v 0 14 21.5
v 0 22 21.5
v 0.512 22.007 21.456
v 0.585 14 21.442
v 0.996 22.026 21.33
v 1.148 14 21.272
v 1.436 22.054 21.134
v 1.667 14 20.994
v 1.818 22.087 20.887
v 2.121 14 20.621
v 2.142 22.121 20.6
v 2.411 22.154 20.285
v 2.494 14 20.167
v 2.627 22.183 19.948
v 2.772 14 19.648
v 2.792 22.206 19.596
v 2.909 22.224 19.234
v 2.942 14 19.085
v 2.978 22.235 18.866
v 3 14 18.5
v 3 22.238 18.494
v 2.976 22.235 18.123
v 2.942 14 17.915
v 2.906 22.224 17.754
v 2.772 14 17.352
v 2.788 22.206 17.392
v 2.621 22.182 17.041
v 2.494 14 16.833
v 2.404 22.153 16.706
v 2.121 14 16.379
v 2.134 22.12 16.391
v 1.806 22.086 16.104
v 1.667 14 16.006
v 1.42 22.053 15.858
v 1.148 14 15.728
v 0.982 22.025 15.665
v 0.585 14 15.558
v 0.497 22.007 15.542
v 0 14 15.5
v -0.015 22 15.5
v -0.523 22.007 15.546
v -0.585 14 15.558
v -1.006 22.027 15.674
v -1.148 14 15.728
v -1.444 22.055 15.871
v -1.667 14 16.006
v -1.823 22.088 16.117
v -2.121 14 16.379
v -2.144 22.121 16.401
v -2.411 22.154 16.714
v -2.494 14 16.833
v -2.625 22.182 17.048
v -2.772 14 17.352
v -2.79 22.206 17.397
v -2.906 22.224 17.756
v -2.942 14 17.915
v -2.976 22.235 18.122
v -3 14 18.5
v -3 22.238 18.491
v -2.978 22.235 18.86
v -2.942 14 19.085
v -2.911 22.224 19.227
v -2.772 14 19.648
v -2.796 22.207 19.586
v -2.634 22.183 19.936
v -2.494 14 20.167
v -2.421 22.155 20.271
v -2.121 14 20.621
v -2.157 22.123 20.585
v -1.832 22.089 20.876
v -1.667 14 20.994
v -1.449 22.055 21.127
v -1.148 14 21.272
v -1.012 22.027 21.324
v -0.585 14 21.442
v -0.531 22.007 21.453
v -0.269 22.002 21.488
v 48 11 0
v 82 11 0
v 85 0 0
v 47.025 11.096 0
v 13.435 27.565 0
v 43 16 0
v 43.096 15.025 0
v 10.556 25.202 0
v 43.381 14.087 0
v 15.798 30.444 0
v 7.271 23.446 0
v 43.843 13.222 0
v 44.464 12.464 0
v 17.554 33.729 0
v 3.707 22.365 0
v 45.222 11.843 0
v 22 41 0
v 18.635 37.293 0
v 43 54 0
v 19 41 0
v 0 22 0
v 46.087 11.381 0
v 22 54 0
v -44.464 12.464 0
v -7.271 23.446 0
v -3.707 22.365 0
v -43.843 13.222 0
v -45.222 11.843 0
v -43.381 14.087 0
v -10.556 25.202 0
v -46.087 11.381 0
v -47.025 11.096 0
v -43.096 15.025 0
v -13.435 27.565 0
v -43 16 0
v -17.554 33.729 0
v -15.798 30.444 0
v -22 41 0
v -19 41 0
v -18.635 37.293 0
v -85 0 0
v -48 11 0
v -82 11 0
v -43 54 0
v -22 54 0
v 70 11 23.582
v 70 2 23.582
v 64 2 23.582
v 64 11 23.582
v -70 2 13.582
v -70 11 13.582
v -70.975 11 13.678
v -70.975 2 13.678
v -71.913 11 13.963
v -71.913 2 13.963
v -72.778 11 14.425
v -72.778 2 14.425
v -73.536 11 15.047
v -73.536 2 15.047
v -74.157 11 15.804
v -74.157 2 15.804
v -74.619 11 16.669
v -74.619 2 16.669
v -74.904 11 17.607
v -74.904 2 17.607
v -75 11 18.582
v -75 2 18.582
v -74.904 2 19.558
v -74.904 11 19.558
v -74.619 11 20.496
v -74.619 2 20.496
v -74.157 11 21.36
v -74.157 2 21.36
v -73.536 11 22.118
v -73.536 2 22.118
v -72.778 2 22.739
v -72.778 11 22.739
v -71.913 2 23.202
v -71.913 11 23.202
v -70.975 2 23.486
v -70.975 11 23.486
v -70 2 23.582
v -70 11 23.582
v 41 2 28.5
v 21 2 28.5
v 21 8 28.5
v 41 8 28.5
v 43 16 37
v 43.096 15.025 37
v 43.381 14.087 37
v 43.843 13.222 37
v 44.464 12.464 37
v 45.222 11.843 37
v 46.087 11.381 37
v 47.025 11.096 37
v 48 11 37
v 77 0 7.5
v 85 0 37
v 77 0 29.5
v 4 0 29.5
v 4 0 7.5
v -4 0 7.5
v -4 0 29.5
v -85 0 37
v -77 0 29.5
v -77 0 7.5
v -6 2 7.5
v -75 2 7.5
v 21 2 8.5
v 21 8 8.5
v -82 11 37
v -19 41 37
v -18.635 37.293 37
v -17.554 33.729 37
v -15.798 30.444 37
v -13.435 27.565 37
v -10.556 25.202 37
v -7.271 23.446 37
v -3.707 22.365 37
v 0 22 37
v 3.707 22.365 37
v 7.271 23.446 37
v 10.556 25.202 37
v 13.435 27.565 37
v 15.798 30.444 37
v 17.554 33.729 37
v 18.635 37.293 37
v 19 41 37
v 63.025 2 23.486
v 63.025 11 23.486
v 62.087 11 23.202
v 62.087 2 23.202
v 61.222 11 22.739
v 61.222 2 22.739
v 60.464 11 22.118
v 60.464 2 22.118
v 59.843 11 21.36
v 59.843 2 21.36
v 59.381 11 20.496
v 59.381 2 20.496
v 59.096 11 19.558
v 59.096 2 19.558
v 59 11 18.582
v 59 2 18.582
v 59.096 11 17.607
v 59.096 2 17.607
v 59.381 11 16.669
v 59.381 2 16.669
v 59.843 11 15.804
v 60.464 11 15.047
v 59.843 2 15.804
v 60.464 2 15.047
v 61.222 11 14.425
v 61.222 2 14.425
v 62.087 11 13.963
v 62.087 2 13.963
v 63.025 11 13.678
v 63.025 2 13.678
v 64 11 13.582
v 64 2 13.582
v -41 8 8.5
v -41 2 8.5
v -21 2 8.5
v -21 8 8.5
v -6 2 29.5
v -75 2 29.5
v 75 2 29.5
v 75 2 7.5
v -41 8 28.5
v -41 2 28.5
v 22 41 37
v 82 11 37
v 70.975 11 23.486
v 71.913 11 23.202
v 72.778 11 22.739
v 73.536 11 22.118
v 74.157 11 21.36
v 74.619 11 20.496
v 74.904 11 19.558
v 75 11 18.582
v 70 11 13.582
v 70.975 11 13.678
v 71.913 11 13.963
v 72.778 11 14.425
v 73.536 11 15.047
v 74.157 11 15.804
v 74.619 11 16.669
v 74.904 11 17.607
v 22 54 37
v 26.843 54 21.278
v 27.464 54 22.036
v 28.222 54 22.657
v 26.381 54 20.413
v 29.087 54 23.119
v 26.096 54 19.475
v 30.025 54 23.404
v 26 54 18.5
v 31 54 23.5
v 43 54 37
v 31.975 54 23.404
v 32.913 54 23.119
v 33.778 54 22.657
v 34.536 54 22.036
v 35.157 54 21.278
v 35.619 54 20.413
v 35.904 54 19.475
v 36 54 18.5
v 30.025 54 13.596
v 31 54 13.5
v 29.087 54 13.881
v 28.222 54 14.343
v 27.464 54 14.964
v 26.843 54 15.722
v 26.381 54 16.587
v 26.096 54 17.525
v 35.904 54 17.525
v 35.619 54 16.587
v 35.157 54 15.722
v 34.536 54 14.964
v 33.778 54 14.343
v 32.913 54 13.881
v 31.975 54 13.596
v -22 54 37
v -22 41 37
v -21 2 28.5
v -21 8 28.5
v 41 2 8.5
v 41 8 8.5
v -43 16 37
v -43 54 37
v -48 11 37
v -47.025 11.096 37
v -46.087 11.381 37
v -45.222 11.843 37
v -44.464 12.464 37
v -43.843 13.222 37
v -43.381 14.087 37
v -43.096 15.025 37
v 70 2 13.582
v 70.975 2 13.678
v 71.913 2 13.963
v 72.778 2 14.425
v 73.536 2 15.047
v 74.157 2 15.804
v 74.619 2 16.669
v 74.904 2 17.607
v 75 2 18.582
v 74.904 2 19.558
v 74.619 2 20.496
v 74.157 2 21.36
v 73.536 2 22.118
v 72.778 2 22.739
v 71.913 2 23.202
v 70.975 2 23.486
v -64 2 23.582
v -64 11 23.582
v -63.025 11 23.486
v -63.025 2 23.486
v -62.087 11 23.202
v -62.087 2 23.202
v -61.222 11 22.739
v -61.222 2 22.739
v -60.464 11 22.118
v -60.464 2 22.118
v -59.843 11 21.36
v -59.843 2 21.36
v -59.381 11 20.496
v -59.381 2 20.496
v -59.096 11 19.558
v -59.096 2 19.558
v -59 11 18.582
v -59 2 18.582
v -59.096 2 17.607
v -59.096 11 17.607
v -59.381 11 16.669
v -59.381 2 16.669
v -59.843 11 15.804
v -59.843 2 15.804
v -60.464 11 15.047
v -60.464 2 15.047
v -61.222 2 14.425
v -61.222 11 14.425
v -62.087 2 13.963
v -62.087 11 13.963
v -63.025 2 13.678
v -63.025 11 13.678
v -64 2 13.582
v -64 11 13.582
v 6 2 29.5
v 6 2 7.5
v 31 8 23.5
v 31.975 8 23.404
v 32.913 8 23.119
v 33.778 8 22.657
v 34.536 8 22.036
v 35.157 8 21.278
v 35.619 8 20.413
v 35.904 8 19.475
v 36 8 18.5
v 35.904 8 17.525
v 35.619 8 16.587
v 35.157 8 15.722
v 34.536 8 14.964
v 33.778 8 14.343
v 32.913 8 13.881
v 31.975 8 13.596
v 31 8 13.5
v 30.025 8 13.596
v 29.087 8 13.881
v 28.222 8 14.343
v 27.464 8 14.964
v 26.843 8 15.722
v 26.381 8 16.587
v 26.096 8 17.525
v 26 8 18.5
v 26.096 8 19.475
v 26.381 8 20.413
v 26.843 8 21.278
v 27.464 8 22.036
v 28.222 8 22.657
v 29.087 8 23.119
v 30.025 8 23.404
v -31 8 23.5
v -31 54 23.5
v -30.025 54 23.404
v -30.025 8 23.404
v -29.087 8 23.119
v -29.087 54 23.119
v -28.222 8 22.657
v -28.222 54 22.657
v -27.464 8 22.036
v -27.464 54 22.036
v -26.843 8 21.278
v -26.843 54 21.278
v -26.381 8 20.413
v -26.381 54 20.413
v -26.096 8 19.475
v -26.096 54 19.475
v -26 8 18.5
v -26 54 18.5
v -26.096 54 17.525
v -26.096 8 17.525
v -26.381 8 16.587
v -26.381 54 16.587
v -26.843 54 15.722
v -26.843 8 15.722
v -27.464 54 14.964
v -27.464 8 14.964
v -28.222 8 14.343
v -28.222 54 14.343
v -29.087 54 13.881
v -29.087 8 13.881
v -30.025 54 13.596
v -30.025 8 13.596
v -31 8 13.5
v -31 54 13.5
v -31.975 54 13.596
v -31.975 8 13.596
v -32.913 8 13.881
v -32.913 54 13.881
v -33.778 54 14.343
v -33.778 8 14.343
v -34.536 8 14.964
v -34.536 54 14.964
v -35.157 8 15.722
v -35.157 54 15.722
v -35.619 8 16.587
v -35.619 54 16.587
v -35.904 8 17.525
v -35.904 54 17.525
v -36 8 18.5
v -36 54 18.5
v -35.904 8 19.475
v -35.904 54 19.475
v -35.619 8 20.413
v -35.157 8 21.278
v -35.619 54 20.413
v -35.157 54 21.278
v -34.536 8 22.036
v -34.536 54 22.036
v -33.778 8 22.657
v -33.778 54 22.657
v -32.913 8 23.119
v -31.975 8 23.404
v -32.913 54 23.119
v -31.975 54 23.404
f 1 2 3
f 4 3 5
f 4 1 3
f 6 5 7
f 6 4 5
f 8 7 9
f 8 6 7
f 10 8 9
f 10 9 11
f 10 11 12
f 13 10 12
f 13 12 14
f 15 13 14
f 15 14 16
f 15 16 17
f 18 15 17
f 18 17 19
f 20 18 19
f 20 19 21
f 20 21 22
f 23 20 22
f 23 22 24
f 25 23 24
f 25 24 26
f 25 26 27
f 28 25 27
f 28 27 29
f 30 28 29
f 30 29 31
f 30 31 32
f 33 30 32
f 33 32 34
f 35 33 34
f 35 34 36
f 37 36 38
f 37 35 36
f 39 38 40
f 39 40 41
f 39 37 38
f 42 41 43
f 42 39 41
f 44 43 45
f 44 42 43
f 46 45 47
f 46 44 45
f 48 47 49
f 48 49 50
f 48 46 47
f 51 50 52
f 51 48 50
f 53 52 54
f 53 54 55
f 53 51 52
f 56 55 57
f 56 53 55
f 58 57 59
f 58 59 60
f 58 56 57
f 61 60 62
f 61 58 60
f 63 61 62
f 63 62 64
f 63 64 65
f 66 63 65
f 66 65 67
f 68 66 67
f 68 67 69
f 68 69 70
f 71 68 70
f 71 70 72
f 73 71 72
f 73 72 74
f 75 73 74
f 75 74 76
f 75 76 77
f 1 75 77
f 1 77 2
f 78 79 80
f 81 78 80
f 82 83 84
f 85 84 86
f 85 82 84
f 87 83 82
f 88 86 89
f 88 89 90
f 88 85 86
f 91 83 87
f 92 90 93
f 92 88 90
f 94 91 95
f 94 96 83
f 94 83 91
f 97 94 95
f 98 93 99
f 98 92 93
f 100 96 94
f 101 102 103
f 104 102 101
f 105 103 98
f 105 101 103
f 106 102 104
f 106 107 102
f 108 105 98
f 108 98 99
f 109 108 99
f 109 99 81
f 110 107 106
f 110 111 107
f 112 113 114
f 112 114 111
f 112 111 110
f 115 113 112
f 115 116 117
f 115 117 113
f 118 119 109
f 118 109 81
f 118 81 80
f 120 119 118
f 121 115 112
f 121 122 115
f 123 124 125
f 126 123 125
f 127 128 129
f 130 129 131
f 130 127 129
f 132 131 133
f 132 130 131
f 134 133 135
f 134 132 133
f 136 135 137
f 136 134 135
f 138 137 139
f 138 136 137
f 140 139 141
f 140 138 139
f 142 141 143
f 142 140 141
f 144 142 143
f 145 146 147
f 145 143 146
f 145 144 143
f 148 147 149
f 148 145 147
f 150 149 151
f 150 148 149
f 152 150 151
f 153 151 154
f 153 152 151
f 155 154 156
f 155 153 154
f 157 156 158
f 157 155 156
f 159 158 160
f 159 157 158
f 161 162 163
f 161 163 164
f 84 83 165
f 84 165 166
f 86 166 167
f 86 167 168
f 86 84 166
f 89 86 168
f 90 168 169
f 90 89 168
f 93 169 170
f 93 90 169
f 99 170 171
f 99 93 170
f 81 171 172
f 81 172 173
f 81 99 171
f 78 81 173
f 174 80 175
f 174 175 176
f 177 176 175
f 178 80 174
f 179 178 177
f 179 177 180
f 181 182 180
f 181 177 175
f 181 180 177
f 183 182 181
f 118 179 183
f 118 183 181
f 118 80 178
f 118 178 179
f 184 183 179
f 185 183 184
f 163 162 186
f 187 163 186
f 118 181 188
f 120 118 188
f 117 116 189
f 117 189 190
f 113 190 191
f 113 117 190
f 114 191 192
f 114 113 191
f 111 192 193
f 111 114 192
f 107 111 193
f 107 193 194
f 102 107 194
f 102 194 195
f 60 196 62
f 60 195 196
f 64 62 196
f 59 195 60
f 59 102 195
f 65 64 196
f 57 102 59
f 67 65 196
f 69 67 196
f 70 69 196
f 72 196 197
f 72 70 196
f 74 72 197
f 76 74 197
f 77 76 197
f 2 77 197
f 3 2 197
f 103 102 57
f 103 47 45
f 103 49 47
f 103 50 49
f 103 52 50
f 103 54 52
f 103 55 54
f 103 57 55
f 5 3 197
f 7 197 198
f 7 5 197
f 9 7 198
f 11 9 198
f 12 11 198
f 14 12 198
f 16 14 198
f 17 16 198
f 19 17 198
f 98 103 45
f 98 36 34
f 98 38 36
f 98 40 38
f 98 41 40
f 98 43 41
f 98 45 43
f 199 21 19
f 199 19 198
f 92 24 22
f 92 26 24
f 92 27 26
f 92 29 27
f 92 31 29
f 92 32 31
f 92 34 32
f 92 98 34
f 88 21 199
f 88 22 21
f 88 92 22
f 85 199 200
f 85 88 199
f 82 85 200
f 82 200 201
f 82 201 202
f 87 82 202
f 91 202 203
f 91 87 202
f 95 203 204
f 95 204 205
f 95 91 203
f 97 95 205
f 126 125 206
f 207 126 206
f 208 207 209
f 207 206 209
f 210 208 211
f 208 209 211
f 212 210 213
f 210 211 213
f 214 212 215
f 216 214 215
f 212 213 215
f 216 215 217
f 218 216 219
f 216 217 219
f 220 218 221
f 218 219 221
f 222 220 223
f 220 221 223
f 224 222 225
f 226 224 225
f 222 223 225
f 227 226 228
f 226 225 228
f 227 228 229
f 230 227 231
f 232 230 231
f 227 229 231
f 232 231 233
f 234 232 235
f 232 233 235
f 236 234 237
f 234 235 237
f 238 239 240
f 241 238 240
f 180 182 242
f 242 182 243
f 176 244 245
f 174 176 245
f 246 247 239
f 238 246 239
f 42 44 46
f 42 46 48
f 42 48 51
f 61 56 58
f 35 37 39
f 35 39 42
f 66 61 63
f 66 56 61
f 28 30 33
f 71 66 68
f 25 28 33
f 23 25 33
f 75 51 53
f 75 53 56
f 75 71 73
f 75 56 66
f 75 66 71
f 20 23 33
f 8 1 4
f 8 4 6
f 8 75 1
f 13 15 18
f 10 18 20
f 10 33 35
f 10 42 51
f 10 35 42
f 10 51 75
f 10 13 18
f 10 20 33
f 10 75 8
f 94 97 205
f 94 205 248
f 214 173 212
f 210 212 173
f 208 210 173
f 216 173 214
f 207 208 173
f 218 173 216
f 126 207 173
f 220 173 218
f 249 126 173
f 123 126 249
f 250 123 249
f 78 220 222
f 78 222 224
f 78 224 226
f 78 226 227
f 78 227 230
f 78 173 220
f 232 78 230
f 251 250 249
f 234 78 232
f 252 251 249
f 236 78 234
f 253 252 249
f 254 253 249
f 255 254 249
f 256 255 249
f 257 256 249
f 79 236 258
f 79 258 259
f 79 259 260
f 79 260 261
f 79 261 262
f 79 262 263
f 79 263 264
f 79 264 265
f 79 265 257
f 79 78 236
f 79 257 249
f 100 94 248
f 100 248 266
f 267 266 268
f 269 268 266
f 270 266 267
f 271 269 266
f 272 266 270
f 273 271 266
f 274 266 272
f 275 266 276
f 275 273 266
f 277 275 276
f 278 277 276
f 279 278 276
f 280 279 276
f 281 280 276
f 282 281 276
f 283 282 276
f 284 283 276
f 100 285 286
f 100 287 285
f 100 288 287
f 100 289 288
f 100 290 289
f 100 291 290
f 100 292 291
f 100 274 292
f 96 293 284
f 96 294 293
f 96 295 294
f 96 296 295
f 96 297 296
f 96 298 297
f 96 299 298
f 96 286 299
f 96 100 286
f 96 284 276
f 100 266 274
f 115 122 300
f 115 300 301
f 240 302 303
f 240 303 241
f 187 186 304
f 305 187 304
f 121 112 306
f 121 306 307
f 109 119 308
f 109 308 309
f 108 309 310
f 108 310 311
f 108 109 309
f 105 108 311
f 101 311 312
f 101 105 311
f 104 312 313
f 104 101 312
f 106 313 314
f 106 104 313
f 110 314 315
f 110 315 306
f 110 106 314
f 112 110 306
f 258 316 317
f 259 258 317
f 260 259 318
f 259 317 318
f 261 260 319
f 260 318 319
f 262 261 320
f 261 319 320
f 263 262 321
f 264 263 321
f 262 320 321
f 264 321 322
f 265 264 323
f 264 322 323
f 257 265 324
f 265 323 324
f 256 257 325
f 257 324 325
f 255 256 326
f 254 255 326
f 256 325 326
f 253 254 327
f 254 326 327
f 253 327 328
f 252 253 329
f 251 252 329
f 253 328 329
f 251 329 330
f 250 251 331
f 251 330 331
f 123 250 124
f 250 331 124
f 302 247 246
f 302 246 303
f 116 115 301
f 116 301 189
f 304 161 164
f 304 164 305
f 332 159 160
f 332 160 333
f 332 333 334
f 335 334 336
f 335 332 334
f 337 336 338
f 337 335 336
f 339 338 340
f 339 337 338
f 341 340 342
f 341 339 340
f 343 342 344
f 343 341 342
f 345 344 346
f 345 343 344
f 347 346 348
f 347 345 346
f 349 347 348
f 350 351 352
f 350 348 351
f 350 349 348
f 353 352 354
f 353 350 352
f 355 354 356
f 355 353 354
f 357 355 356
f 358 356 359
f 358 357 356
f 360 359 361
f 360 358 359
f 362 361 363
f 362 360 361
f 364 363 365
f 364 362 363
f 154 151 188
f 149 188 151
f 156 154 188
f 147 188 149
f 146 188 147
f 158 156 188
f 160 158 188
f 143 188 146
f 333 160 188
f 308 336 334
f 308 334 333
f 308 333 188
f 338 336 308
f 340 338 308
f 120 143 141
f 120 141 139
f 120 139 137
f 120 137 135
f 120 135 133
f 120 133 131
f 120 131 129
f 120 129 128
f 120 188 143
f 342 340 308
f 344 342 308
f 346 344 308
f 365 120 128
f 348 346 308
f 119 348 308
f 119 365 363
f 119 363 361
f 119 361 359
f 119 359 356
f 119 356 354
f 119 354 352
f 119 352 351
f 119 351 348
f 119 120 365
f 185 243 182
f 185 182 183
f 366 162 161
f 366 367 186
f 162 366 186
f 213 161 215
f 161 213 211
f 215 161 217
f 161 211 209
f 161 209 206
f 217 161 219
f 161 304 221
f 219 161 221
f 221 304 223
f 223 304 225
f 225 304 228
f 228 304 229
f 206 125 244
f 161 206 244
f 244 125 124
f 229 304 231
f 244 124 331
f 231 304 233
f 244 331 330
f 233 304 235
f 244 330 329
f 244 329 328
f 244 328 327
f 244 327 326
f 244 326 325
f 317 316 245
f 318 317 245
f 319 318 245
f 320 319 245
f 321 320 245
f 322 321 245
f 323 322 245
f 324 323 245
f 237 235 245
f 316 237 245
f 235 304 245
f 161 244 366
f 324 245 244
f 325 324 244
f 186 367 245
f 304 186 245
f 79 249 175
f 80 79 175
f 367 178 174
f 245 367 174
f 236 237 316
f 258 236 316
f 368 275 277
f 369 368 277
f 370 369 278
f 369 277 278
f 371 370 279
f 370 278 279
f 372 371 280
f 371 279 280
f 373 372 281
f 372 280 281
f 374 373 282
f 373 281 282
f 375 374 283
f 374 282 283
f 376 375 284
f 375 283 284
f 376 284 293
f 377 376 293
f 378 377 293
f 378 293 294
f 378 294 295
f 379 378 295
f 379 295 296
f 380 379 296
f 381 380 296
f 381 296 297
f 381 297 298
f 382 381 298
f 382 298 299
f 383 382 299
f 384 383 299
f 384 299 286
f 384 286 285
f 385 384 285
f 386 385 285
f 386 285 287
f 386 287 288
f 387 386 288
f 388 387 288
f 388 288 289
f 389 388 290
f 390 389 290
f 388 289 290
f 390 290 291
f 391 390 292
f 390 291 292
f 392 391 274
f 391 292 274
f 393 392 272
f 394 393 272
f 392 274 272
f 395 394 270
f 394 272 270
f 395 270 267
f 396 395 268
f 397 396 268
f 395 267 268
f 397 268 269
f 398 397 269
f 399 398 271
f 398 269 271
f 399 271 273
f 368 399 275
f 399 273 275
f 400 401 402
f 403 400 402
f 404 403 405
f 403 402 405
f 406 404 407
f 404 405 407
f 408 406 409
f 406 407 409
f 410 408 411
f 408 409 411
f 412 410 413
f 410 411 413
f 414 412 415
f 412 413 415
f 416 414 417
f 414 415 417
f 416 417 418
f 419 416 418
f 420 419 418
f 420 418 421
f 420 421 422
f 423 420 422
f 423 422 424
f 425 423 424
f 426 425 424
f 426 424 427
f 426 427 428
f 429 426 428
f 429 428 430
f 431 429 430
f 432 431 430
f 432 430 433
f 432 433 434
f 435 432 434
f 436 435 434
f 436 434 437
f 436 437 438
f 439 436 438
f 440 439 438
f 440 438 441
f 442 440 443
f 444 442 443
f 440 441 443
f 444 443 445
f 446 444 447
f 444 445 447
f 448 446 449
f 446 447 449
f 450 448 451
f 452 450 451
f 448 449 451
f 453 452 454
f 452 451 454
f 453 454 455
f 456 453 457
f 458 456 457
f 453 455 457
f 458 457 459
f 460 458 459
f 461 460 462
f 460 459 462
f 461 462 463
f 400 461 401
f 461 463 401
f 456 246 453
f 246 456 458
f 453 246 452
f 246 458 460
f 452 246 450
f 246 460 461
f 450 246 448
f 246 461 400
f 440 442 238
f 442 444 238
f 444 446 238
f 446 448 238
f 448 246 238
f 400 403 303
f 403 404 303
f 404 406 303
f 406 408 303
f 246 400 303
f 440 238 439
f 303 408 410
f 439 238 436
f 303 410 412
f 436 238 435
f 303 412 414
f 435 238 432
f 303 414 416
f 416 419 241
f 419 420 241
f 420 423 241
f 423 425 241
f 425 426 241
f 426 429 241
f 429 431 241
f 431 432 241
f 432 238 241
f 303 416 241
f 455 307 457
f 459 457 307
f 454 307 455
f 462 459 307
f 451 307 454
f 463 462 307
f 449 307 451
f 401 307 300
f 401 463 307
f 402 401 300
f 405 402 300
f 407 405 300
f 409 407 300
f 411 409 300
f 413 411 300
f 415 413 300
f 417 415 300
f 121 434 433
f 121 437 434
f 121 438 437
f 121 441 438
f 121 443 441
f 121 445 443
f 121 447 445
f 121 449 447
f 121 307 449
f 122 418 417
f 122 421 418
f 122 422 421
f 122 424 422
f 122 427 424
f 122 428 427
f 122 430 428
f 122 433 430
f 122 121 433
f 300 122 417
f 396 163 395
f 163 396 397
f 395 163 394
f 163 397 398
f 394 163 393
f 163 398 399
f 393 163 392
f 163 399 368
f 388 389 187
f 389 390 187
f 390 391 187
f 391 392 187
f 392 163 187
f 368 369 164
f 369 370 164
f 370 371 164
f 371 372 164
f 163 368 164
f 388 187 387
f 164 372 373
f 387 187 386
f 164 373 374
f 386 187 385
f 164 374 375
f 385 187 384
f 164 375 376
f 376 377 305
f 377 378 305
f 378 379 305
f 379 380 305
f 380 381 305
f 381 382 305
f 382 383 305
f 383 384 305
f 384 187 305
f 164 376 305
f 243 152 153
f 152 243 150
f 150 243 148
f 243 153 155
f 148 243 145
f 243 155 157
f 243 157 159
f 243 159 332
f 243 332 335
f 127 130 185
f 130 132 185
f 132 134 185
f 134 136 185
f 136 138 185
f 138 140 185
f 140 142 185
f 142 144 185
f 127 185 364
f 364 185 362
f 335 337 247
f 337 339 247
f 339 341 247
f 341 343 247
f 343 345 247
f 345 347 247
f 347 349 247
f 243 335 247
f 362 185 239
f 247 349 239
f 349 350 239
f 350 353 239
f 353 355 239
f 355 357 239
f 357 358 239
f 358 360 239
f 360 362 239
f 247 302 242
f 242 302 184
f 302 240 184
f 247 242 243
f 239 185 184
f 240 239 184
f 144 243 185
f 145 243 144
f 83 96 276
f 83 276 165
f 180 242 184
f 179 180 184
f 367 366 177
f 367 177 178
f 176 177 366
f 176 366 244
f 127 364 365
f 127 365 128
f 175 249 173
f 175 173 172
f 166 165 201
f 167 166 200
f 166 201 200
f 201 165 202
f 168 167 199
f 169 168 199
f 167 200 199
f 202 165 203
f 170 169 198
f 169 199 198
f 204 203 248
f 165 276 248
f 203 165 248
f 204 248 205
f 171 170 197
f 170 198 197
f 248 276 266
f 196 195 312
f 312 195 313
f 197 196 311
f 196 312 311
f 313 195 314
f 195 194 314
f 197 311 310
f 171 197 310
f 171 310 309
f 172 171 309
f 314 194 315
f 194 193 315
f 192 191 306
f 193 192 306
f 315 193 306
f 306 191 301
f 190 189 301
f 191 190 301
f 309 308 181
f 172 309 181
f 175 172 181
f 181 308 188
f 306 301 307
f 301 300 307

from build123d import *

# Parameters (mm, degrees)
BOSS_EXTRUDE1_DEPTH     = 37
SKETCH2_W               = 73
SKETCH2_H               = 22
CUT_EXTRUDE2_DEPTH      = 2
CHAMFER1_SIZE           = 2
CHAMFER2_SIZE           = 2
CHAMFER3_SIZE           = 2
CHAMFER4_SIZE           = 2
SKETCH3_W               = 20
SKETCH3_H               = 20
CUT_EXTRUDE4_DEPTH      = 8
CUT_EXTRUDE5_DEPTH      = 107.292050502
SKETCH6_R               = 5
CUT_EXTRUDE6_DEPTH      = 108.284668057
CUT_EXTRUDE7_DEPTH      = 21
CUT_EXTRUDE7_DEPTH_BACK = 2
SKETCH8_R               = 3


with BuildPart() as part:
    # Sketch1 → Boss-Extrude1 (new body)
    with BuildSketch(Plane.XY):
        with BuildLine():
            Line((85, 0), (-85, 0))
            Line((-85, 0), (-82, 11))
            Line((-82, 11), (-48, 11))
            ThreePointArc((-48, 11), (-44.464466094, 12.464466094), (-43, 16))
            Line((-43, 16), (-43, 54))
            Line((-43, 54), (-22, 54))
            Line((-22, 54), (-22, 41))
            Line((-22, 41), (-19, 41))
            ThreePointArc((-19, 41), (0, 22), (19, 41))
            Line((19, 41), (22, 41))
            Line((22, 41), (22, 54))
            Line((22, 54), (43, 54))
            Line((43, 54), (43, 16))
            ThreePointArc((43, 16), (44.464466094, 12.464466094), (48, 11))
            Line((48, 11), (82, 11))
            Line((82, 11), (85, 0))
        make_face()
    extrude(amount=BOSS_EXTRUDE1_DEPTH)

    # Sketch2 → Cut-Extrude2 (cut)
    with BuildSketch(Plane(origin=(0, 0, 0), x_dir=(1, 0, 0), z_dir=(0, 1, 0))):
        with Locations((-40.5, -18.5)):
            Rectangle(SKETCH2_W, SKETCH2_H)
        with Locations((40.5, -18.5)):
            Rectangle(SKETCH2_W, SKETCH2_H)
    extrude(amount=CUT_EXTRUDE2_DEPTH, mode=Mode.SUBTRACT)

    # Chamfer1
    chamfer1_edges = [part.edges().sort_by_distance(p)[0] for p in [
        (-77, 2, 18.5),
    ]]
    chamfer(chamfer1_edges, length=CHAMFER1_SIZE - 0.0001)  # a hair under: the kernel refuses the full size

    # Chamfer2
    chamfer2_edges = [part.edges().sort_by_distance(p)[0] for p in [
        (4, 2, 18.5),
    ]]
    chamfer(chamfer2_edges, length=CHAMFER2_SIZE - 0.0001)  # a hair under: the kernel refuses the full size

    # Chamfer3
    chamfer3_edges = [part.edges().sort_by_distance(p)[0] for p in [
        (-4, 2, 18.5),
    ]]
    chamfer(chamfer3_edges, length=CHAMFER3_SIZE - 0.0001)  # a hair under: the kernel refuses the full size

    # Chamfer4
    chamfer4_edges = [part.edges().sort_by_distance(p)[0] for p in [
        (77, 2, 18.5),
    ]]
    chamfer(chamfer4_edges, length=CHAMFER4_SIZE - 0.0001)  # a hair under: the kernel refuses the full size

    # Sketch3 → Cut-Extrude4 (cut)
    with BuildSketch(Plane(origin=(0, 0, 0), x_dir=(1, 0, 0), z_dir=(0, 1, 0))):
        with Locations((-31, -18.5)):
            Rectangle(SKETCH3_W, SKETCH3_H)
        with Locations((31, -18.5)):
            Rectangle(SKETCH3_W, SKETCH3_H)
    extrude(amount=CUT_EXTRUDE4_DEPTH, mode=Mode.SUBTRACT)

    # Sketch5 → Cut-Extrude5 (cut, through all)
    with BuildSketch(Plane.XZ.offset(-2)):
        with BuildLine():
            Line((70, 23.582105154), (64, 23.582105154))
            ThreePointArc((64, 23.582105154), (59, 18.582105154), (64, 13.582105154))
            Line((64, 13.582105154), (70, 13.582105154))
            ThreePointArc((70, 13.582105154), (75, 18.582105154), (70, 23.582105154))
        make_face()
        with BuildLine():
            Line((-70, 23.582105154), (-64, 23.582105154))
            ThreePointArc((-64, 23.582105154), (-59, 18.582105154), (-64, 13.582105154))
            Line((-64, 13.582105154), (-70, 13.582105154))
            ThreePointArc((-70, 13.582105154), (-75, 18.582105154), (-70, 23.582105154))
        make_face()
    extrude(amount=-CUT_EXTRUDE5_DEPTH, mode=Mode.SUBTRACT)

    # Sketch6 → Cut-Extrude6 (cut, through all)
    with BuildSketch(Plane(origin=(0, 54, 0), x_dir=(1, 0, 0), z_dir=(0, 1, 0))):
        with Locations(Location((-31, -18.5, 0), (0, 0, 270))):
            Circle(SKETCH6_R)
        with Locations(Location((31, -18.5, 0), (0, 0, 270))):
            Circle(SKETCH6_R)
    extrude(amount=-CUT_EXTRUDE6_DEPTH, mode=Mode.SUBTRACT)

    # Sketch8 → Cut-Extrude7 (cut, two sides: drawn at the far end of the back side and taken through both)
    with BuildSketch(Plane(origin=(0, 16, 0), x_dir=(1, 0, 0), z_dir=(0, 1, 0)).offset(-CUT_EXTRUDE7_DEPTH_BACK)):
        with Locations(Location((0, -18.5, 0), (0, 0, 270))):
            Circle(SKETCH8_R)
    extrude(amount=CUT_EXTRUDE7_DEPTH + CUT_EXTRUDE7_DEPTH_BACK, mode=Mode.SUBTRACT)


solid = part.part
